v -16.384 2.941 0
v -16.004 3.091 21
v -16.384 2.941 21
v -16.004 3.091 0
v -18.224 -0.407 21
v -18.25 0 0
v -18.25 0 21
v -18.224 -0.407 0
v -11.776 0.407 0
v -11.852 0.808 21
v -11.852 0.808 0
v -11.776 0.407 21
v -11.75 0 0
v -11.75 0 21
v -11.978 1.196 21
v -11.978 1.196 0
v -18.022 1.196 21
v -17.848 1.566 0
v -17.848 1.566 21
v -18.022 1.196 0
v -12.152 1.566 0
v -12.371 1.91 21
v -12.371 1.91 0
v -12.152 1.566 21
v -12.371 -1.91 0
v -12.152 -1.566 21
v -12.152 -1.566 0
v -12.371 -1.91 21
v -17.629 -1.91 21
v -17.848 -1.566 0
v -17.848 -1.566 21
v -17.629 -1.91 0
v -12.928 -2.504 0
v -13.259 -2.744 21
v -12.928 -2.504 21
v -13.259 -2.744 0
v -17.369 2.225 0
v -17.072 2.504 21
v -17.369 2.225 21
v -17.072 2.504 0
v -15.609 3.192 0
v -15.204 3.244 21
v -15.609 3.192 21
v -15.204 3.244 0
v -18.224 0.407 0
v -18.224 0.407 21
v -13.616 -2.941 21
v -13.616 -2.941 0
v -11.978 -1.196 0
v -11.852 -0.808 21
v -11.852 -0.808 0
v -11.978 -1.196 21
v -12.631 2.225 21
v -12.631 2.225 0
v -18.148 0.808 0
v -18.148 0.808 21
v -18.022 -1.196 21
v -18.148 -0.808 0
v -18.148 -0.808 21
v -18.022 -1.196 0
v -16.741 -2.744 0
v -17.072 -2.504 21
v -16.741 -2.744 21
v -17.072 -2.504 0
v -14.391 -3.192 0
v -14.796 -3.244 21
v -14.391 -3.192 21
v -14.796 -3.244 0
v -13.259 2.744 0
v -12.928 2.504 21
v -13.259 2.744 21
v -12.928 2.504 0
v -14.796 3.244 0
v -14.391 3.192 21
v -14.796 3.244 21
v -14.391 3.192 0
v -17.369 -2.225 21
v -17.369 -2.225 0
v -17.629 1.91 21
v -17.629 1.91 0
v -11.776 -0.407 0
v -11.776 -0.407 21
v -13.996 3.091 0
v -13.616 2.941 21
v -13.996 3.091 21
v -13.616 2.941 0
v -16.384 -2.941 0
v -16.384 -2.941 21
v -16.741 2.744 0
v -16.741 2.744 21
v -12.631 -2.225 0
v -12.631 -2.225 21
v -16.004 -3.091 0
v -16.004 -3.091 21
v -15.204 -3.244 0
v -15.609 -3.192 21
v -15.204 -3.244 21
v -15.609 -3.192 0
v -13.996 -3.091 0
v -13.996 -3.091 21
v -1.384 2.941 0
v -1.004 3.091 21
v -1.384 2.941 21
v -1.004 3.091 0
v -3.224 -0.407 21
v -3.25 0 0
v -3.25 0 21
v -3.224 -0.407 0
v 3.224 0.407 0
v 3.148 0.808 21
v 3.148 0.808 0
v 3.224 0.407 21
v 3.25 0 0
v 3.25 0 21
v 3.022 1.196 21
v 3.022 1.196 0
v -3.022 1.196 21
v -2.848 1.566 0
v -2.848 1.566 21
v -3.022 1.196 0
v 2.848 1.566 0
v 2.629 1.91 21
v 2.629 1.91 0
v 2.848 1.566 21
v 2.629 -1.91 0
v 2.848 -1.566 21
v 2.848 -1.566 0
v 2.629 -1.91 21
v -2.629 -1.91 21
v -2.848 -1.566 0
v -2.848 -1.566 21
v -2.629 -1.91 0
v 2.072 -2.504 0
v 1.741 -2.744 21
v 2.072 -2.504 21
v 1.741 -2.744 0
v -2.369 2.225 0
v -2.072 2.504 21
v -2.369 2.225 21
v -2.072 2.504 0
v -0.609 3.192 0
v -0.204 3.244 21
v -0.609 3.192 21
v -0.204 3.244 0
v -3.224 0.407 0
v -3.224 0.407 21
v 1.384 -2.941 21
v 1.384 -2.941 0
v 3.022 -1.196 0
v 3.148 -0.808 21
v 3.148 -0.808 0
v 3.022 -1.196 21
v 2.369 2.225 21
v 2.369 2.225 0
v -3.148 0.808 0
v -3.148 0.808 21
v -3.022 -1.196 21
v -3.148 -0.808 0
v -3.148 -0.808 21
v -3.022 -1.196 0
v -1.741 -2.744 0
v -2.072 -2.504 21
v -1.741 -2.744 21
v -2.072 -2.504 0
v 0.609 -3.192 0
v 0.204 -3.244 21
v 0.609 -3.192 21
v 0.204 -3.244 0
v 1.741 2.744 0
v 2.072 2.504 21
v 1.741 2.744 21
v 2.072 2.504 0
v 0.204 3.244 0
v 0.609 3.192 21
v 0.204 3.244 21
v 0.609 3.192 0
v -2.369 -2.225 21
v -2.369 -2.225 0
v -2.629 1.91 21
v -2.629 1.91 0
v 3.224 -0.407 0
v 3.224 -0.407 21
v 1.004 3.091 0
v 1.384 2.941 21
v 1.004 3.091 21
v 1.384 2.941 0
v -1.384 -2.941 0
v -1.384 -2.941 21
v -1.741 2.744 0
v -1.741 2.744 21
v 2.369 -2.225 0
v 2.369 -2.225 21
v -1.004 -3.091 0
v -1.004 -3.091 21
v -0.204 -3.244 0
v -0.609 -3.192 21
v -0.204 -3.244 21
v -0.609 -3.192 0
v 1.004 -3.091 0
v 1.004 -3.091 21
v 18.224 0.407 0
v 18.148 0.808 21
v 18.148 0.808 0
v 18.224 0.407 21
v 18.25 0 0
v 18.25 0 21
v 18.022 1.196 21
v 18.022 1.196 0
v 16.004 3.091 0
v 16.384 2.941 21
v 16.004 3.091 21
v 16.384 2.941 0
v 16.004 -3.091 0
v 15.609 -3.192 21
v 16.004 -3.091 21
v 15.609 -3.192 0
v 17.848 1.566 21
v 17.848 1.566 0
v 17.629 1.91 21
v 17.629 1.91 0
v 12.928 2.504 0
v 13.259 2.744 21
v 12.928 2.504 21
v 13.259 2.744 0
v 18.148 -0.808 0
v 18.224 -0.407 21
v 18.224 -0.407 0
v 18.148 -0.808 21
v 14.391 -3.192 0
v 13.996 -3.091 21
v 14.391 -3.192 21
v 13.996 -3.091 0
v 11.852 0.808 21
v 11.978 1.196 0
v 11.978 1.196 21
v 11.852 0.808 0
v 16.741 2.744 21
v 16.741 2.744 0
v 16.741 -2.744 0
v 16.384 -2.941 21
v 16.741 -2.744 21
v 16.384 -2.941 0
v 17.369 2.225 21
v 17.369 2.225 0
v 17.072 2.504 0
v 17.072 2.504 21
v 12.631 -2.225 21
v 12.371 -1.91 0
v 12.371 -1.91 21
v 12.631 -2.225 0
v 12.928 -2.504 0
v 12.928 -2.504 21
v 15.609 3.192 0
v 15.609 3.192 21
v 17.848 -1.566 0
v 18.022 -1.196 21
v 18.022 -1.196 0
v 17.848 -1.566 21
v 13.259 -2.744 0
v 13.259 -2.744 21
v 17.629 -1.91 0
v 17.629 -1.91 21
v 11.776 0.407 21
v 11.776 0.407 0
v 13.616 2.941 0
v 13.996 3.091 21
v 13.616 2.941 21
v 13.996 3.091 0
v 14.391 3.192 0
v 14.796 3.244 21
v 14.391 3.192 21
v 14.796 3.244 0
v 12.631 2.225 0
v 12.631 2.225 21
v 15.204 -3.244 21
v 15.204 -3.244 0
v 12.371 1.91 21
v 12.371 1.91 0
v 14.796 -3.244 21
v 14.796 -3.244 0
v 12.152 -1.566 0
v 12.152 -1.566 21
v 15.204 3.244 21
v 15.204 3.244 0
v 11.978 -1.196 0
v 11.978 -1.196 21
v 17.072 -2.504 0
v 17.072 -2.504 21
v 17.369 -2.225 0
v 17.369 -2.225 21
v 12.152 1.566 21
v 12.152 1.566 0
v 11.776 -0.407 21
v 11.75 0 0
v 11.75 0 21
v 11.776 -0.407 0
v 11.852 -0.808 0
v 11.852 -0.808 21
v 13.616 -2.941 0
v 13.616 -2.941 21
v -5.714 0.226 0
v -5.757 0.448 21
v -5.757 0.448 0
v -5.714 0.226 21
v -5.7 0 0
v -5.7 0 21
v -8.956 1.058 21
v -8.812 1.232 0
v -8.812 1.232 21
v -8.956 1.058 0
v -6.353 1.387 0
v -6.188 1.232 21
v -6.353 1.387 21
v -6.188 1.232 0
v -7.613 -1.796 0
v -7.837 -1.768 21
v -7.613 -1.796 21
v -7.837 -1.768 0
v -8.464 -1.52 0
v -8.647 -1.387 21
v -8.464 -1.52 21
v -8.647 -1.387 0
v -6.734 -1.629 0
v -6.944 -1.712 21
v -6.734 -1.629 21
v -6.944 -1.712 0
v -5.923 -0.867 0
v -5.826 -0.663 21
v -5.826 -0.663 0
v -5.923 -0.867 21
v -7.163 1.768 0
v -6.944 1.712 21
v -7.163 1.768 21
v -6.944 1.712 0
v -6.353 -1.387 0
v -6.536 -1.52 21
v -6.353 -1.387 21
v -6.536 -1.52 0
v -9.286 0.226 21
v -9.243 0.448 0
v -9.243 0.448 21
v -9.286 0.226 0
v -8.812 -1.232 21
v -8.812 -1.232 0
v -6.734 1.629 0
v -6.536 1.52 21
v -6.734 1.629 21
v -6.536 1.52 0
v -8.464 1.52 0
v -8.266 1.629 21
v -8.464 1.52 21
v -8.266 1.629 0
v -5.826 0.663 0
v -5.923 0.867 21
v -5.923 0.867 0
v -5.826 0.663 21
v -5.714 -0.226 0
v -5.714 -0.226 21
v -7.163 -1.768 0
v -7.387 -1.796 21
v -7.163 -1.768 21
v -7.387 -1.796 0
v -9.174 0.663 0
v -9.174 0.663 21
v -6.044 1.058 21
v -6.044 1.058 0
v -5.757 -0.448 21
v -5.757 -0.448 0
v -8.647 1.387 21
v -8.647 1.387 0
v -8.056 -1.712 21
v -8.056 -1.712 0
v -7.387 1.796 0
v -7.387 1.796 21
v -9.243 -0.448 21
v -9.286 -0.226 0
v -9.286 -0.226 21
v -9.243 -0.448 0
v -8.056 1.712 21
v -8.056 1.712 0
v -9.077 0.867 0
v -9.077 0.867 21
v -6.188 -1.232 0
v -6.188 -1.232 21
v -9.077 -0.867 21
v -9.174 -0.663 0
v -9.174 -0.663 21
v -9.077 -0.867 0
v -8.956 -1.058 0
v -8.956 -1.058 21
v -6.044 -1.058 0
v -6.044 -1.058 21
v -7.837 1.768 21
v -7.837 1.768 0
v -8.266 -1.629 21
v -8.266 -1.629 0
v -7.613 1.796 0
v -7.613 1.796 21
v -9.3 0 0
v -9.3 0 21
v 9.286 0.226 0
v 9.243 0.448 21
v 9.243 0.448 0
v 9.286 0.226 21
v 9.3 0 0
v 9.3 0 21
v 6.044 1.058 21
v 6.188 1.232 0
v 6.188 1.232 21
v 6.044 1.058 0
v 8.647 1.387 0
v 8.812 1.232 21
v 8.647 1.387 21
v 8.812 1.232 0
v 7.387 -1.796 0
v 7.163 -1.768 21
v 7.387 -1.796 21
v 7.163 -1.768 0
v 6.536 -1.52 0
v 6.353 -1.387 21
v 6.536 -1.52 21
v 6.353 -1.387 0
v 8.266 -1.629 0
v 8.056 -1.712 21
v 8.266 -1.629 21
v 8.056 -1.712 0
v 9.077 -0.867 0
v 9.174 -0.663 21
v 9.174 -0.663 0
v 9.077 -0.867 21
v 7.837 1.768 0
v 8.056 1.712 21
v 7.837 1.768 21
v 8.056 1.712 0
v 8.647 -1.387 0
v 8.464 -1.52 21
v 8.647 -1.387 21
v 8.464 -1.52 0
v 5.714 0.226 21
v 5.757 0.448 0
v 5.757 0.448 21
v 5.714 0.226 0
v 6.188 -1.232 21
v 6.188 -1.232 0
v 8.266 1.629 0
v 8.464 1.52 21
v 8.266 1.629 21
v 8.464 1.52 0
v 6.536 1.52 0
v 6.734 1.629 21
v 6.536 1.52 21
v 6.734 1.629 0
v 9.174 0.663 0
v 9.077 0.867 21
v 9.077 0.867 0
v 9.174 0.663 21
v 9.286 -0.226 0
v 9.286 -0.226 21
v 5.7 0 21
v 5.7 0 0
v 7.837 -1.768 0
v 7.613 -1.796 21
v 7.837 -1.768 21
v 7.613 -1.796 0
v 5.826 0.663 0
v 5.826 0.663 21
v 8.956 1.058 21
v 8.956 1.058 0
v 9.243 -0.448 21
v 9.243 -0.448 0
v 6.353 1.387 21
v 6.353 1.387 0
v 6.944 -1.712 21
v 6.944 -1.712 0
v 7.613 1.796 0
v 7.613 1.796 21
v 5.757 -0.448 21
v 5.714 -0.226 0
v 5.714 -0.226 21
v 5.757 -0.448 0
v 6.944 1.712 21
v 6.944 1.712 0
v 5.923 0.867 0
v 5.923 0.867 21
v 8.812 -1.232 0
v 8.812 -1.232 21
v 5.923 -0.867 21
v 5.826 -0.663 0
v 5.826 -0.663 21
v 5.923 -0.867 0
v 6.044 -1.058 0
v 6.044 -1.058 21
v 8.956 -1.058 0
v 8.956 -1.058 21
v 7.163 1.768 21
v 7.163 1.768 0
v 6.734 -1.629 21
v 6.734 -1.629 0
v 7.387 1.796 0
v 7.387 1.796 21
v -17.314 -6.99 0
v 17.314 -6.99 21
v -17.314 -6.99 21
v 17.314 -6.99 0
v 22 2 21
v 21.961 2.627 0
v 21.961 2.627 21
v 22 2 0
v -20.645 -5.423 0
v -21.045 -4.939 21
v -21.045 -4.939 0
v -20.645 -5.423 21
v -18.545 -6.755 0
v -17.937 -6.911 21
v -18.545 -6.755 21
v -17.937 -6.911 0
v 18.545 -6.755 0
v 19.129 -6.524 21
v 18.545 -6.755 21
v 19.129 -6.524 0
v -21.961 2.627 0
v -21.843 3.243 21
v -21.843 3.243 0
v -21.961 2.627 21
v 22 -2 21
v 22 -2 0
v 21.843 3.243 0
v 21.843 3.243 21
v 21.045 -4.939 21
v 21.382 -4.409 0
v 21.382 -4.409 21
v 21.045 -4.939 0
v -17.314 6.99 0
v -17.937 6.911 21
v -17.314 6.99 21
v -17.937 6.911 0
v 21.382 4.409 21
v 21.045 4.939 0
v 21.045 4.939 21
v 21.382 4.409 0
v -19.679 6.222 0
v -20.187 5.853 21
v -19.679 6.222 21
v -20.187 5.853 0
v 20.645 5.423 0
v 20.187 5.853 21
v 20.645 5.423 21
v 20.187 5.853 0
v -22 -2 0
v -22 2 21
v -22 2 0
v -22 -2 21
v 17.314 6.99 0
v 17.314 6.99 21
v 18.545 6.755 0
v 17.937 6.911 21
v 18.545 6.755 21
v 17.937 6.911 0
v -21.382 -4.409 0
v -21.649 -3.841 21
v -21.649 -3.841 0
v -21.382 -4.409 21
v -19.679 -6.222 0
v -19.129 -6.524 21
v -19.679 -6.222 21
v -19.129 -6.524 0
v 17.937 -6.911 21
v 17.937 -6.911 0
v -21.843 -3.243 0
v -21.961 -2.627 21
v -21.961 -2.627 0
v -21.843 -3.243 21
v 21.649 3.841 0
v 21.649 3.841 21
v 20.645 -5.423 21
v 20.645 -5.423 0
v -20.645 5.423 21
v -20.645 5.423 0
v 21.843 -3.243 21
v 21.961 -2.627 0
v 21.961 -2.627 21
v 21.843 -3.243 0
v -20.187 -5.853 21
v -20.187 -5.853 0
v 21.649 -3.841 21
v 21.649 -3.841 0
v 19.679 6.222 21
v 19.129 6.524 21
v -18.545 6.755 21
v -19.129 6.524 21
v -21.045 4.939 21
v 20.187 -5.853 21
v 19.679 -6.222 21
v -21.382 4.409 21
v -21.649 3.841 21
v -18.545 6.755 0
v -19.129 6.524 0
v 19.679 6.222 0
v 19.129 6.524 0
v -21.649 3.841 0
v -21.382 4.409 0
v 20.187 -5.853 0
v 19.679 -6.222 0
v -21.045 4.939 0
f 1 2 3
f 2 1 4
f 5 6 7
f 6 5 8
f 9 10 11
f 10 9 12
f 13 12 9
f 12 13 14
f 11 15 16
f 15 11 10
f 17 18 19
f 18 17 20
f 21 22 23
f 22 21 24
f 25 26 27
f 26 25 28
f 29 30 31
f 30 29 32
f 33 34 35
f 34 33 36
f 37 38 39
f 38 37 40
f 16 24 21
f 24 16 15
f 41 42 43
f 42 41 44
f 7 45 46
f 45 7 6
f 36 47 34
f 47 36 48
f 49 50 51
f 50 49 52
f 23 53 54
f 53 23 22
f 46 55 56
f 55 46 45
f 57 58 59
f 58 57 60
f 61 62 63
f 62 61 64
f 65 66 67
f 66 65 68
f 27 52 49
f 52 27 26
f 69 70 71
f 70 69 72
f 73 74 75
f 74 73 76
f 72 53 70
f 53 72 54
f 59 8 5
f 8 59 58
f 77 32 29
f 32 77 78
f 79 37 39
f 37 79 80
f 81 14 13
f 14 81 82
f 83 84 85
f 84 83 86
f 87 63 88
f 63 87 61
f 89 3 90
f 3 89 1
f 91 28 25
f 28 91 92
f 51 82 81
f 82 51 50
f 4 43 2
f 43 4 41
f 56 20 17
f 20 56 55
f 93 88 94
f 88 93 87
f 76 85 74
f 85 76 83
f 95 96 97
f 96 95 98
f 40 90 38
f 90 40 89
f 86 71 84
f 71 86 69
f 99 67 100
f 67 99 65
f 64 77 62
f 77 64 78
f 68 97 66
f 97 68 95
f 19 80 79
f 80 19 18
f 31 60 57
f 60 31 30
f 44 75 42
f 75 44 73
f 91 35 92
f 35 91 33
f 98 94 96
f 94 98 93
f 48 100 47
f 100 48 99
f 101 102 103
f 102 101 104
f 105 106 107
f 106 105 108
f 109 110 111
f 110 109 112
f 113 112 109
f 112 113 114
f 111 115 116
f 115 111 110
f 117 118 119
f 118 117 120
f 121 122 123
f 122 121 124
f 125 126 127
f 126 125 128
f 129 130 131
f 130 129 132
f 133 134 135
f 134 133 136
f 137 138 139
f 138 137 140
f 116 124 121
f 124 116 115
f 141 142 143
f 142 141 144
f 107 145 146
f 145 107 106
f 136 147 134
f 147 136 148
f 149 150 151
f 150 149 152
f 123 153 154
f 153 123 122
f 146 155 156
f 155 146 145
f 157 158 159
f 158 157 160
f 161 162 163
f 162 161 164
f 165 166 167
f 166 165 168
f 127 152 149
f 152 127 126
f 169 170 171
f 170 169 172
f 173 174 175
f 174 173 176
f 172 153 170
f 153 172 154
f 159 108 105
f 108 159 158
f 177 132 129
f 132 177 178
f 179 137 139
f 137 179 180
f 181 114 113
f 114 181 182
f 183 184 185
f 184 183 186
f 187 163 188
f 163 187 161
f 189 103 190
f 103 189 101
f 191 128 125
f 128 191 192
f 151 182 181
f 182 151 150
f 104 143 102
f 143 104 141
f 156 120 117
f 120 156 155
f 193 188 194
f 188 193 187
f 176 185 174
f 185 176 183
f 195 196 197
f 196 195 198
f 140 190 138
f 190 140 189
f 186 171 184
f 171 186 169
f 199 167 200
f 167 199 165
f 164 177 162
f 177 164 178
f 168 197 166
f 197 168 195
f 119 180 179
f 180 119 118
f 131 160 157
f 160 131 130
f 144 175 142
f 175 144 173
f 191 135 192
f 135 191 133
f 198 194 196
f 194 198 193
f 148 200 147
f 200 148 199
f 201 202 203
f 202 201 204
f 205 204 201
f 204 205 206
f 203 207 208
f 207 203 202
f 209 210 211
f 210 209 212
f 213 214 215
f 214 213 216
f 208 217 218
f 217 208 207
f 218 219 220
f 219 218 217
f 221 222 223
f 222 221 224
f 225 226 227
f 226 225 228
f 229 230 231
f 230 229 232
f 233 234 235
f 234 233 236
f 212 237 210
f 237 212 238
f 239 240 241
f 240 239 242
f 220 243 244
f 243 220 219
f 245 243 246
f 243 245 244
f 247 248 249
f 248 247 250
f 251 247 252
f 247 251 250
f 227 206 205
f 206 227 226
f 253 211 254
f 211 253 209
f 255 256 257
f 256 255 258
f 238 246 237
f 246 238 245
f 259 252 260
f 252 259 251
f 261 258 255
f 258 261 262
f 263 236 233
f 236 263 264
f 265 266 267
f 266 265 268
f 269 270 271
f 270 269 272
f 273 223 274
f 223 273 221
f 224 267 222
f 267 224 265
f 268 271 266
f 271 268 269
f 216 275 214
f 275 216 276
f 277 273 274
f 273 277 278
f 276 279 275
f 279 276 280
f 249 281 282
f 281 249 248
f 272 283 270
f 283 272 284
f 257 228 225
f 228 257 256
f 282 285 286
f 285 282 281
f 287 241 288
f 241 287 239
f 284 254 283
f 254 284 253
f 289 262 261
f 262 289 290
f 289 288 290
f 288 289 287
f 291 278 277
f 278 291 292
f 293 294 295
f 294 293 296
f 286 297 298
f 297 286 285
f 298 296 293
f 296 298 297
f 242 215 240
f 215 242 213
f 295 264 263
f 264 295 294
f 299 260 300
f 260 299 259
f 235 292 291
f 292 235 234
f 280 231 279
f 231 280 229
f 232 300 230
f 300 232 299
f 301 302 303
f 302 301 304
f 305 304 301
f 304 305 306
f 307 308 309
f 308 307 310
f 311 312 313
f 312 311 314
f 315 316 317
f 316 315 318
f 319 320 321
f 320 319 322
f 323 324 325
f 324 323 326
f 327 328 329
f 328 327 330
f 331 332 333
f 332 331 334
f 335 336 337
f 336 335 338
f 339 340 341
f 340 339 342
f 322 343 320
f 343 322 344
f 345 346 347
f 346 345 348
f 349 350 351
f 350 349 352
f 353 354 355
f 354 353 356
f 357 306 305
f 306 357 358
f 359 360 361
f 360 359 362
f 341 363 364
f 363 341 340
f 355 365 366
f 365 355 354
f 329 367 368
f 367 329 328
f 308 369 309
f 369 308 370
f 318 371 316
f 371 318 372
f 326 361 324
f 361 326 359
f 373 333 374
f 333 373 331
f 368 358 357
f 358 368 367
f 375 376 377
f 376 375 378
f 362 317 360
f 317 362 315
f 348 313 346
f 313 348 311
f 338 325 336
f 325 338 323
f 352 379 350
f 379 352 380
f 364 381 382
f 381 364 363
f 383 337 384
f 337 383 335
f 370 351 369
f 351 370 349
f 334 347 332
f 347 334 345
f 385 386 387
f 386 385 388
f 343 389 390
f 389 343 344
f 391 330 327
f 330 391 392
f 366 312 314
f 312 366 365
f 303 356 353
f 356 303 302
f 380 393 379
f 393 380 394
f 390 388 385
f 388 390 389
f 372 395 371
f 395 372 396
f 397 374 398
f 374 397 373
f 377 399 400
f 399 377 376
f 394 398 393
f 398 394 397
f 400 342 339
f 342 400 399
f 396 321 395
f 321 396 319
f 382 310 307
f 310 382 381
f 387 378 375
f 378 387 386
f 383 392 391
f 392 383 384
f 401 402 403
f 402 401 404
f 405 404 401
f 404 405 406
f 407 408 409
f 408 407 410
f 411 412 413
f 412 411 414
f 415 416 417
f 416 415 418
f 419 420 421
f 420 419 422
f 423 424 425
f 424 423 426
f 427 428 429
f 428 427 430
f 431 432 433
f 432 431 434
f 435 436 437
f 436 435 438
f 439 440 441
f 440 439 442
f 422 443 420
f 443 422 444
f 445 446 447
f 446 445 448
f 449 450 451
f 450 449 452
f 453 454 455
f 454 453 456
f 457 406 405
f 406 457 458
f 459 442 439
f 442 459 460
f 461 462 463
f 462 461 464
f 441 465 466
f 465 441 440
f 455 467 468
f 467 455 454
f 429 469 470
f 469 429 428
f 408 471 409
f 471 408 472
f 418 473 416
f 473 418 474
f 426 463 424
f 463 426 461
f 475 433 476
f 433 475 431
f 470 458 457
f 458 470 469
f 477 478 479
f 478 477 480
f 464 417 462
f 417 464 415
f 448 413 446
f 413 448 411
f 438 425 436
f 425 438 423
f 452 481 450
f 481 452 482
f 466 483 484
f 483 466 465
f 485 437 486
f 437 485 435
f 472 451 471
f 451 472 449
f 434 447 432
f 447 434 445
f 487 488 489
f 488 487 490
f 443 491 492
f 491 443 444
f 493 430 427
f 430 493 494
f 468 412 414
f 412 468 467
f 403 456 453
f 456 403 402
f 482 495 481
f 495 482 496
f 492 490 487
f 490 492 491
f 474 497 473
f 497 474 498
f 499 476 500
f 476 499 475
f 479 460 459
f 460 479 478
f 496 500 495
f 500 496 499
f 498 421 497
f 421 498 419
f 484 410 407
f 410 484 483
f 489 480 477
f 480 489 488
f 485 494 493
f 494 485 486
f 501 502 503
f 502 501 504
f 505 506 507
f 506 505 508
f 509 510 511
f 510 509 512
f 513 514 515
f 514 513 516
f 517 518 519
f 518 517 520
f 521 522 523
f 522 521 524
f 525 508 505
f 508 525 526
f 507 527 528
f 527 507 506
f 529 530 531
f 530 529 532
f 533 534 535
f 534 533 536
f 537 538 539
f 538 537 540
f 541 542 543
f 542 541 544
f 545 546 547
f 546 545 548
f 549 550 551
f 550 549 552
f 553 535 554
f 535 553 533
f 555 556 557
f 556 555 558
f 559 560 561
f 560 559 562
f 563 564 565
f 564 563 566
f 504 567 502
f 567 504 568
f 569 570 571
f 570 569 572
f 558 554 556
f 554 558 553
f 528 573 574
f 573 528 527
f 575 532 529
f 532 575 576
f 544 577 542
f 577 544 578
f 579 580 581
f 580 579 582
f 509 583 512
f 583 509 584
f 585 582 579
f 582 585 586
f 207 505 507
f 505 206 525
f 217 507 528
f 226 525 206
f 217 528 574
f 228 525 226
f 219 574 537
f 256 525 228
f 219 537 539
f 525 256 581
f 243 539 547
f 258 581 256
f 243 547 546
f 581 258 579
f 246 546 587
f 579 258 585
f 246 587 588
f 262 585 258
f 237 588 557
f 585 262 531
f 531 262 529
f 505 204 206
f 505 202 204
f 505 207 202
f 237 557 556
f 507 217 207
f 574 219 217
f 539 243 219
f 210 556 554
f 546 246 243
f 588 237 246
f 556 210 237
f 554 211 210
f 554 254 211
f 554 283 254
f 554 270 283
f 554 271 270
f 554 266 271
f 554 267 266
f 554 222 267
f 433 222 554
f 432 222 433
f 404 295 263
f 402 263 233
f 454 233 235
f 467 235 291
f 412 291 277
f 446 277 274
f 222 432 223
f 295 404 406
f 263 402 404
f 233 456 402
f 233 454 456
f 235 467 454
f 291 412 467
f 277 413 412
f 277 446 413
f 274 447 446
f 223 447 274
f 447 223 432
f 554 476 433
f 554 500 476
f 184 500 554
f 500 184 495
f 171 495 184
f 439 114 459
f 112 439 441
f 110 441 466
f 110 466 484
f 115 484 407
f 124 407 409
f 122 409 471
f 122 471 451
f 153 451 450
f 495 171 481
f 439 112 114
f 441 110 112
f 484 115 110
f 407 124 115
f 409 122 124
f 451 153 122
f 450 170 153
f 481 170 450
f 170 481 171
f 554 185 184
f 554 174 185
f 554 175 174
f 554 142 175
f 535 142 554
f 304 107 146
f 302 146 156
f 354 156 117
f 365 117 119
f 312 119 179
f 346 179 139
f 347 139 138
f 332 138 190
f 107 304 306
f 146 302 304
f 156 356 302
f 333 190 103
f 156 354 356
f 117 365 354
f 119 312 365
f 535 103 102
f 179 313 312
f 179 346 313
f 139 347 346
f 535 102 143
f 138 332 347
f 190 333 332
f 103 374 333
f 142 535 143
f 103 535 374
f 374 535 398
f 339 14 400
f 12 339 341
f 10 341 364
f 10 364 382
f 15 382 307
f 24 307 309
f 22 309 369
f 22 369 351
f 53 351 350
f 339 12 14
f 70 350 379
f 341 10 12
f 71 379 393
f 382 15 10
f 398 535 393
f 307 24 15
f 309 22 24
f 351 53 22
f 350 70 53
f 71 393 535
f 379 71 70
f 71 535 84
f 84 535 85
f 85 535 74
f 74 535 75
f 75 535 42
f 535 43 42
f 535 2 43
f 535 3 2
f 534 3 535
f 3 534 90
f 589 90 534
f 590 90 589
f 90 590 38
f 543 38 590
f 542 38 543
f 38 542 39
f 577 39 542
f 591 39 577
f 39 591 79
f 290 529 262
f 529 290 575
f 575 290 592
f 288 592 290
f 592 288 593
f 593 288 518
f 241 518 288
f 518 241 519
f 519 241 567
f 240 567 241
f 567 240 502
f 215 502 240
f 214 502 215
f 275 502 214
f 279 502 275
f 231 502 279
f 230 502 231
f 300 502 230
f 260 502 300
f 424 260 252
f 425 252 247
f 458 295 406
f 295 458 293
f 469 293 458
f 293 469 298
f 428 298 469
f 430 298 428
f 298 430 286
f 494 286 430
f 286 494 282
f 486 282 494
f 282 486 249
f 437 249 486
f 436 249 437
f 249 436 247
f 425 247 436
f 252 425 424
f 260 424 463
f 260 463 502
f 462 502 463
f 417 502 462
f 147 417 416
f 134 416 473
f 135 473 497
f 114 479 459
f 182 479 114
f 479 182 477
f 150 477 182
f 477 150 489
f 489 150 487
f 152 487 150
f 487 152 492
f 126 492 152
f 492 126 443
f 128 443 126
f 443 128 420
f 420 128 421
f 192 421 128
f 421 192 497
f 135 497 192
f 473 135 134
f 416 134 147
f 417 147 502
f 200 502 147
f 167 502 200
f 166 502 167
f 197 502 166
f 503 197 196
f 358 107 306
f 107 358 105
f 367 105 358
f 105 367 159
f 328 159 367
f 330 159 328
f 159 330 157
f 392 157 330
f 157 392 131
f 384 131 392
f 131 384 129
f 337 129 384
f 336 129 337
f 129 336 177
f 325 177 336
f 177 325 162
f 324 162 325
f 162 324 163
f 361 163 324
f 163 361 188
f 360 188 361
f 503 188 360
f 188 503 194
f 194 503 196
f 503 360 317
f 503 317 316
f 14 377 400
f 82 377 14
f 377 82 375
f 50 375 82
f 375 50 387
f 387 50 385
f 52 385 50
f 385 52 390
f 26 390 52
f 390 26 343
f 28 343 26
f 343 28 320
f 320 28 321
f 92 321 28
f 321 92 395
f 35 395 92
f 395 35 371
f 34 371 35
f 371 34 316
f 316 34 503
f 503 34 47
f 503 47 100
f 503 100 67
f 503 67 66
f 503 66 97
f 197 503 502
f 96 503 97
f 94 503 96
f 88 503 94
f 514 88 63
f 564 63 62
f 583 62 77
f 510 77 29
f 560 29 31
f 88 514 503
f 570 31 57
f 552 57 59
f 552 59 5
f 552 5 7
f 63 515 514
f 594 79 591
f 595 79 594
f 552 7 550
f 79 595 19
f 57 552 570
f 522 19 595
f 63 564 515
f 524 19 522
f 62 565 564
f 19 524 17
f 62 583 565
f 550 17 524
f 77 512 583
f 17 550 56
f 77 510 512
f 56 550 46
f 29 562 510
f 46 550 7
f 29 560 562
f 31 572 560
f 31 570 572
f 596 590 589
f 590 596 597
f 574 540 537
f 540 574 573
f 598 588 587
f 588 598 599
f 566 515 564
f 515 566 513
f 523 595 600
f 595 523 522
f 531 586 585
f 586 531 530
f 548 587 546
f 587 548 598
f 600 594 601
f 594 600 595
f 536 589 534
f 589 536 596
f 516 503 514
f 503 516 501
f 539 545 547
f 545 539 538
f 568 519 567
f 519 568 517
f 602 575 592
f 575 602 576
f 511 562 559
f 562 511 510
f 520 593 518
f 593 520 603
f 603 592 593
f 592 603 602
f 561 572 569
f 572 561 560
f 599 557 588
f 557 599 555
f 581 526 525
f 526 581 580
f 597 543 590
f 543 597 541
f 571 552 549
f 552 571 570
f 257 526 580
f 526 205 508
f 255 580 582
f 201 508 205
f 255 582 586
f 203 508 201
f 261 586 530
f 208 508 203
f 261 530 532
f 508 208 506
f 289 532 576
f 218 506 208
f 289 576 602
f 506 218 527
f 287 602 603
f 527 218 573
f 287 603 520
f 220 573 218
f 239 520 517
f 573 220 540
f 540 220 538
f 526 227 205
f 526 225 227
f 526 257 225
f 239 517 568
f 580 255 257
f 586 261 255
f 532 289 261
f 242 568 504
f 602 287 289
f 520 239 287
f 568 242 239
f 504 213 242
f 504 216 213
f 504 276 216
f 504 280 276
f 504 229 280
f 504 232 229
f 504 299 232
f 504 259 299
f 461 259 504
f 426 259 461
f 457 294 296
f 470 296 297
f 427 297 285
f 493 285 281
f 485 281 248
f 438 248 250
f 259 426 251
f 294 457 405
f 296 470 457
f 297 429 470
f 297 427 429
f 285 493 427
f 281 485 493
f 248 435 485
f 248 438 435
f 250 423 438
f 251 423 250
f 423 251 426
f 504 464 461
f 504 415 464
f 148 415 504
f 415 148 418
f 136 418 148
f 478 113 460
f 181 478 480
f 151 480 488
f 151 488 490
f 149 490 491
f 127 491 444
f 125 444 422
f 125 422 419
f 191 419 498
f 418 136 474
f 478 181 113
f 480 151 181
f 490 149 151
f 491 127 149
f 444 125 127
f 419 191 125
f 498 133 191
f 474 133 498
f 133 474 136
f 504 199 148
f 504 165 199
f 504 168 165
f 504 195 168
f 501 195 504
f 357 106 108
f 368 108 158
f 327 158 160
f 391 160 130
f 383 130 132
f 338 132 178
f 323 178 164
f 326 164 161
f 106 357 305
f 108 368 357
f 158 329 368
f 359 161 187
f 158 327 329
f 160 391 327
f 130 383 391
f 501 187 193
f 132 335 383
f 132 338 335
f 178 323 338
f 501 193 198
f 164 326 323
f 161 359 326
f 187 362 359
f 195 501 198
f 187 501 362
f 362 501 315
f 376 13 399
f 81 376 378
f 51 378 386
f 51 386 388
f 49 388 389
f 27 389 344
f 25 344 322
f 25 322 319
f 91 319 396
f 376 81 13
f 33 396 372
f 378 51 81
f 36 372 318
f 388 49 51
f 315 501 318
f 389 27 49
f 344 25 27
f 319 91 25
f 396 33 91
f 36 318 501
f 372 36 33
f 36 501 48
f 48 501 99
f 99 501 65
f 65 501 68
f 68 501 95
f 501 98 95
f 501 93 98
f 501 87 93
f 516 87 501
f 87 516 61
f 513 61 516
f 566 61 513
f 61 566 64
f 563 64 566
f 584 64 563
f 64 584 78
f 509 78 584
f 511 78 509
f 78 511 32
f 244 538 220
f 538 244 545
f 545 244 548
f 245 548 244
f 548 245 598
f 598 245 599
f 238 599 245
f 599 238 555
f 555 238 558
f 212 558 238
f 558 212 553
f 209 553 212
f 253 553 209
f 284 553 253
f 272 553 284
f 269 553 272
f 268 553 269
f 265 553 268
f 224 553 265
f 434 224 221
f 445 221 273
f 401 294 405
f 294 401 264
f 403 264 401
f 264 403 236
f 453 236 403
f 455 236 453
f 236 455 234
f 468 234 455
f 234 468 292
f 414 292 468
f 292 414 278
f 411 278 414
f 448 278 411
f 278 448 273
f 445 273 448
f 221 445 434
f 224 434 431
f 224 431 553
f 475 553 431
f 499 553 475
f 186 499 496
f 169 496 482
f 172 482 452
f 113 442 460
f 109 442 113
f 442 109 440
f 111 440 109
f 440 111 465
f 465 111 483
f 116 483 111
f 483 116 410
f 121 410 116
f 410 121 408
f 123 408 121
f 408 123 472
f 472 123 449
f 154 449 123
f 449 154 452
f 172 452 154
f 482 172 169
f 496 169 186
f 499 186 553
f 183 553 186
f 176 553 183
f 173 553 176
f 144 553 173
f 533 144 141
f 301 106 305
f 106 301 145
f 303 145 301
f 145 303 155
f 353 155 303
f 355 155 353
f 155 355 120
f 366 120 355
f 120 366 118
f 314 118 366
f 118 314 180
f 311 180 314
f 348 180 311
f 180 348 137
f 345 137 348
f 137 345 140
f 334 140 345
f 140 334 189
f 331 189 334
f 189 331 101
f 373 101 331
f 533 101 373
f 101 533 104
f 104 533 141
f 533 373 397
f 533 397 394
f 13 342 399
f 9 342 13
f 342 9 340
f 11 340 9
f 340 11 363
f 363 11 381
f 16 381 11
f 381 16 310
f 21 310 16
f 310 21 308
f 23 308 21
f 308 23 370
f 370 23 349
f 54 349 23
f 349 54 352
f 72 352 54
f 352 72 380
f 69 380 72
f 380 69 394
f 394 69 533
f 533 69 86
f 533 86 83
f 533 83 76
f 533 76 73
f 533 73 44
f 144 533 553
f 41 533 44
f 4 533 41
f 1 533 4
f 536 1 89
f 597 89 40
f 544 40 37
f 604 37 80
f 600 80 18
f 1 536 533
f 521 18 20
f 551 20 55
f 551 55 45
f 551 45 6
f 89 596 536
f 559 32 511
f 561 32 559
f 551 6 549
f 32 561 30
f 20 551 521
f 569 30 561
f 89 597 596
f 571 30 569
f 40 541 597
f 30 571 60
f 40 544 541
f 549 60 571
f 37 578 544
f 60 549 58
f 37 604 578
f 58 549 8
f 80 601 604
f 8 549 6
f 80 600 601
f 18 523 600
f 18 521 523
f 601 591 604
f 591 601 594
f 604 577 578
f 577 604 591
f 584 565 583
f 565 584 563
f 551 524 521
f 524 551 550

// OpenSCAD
$fn = 50;


difference() {
	union() {
		*color(alpha = 1.0000000000, c = "gray") {
			translate(v = [0, 7, 0]) {
				linear_extrude(height = 1) {
					text(font = "Arial:style=Bold", halign = "center", size = 4.5000000000, text = "COMMENT plate main", valign = "center");
				}
			}
		}
		hull() {
			translate(v = [-17.0000000000, 2.0000000000, 0]) {
				cylinder(h = 21, r = 5);
			}
			translate(v = [17.0000000000, 2.0000000000, 0]) {
				cylinder(h = 21, r = 5);
			}
			translate(v = [-17.0000000000, -2.0000000000, 0]) {
				cylinder(h = 21, r = 5);
			}
			translate(v = [17.0000000000, -2.0000000000, 0]) {
				cylinder(h = 21, r = 5);
			}
		}
	}
	union() {
		*color(alpha = 1.0000000000, c = "gray") {
			translate(v = [0, 7, 0]) {
				linear_extrude(height = 1) {
					text(font = "Arial:style=Bold", halign = "center", size = 4.5000000000, text = "COMMENT holes main", valign = "center");
				}
			}
		}
		translate(v = [-15.0000000000, 0.0000000000, 0]) {
			translate(v = [0, 0, -100]) {
				cylinder(h = 200, r = 3.2500000000);
			}
		}
		translate(v = [0, 0, -100]) {
			cylinder(h = 200, r = 3.2500000000);
		}
		translate(v = [15.0000000000, 0.0000000000, 0]) {
			translate(v = [0, 0, -100]) {
				cylinder(h = 200, r = 3.2500000000);
			}
		}
		translate(v = [-15.0000000000, 0.0000000000, 0]) {
			translate(v = [0, 0, -100]) {
				cylinder(h = 200, r = 1.8000000000);
			}
		}
		translate(v = [-7.5000000000, 0.0000000000, 0]) {
			translate(v = [0, 0, -100]) {
				cylinder(h = 200, r = 1.8000000000);
			}
		}
		translate(v = [0, 0, -100]) {
			cylinder(h = 200, r = 1.8000000000);
		}
		translate(v = [7.5000000000, 0.0000000000, 0]) {
			translate(v = [0, 0, -100]) {
				cylinder(h = 200, r = 1.8000000000);
			}
		}
		translate(v = [15.0000000000, 0.0000000000, 0]) {
			translate(v = [0, 0, -100]) {
				cylinder(h = 200, r = 1.8000000000);
			}
		}
	}
}
